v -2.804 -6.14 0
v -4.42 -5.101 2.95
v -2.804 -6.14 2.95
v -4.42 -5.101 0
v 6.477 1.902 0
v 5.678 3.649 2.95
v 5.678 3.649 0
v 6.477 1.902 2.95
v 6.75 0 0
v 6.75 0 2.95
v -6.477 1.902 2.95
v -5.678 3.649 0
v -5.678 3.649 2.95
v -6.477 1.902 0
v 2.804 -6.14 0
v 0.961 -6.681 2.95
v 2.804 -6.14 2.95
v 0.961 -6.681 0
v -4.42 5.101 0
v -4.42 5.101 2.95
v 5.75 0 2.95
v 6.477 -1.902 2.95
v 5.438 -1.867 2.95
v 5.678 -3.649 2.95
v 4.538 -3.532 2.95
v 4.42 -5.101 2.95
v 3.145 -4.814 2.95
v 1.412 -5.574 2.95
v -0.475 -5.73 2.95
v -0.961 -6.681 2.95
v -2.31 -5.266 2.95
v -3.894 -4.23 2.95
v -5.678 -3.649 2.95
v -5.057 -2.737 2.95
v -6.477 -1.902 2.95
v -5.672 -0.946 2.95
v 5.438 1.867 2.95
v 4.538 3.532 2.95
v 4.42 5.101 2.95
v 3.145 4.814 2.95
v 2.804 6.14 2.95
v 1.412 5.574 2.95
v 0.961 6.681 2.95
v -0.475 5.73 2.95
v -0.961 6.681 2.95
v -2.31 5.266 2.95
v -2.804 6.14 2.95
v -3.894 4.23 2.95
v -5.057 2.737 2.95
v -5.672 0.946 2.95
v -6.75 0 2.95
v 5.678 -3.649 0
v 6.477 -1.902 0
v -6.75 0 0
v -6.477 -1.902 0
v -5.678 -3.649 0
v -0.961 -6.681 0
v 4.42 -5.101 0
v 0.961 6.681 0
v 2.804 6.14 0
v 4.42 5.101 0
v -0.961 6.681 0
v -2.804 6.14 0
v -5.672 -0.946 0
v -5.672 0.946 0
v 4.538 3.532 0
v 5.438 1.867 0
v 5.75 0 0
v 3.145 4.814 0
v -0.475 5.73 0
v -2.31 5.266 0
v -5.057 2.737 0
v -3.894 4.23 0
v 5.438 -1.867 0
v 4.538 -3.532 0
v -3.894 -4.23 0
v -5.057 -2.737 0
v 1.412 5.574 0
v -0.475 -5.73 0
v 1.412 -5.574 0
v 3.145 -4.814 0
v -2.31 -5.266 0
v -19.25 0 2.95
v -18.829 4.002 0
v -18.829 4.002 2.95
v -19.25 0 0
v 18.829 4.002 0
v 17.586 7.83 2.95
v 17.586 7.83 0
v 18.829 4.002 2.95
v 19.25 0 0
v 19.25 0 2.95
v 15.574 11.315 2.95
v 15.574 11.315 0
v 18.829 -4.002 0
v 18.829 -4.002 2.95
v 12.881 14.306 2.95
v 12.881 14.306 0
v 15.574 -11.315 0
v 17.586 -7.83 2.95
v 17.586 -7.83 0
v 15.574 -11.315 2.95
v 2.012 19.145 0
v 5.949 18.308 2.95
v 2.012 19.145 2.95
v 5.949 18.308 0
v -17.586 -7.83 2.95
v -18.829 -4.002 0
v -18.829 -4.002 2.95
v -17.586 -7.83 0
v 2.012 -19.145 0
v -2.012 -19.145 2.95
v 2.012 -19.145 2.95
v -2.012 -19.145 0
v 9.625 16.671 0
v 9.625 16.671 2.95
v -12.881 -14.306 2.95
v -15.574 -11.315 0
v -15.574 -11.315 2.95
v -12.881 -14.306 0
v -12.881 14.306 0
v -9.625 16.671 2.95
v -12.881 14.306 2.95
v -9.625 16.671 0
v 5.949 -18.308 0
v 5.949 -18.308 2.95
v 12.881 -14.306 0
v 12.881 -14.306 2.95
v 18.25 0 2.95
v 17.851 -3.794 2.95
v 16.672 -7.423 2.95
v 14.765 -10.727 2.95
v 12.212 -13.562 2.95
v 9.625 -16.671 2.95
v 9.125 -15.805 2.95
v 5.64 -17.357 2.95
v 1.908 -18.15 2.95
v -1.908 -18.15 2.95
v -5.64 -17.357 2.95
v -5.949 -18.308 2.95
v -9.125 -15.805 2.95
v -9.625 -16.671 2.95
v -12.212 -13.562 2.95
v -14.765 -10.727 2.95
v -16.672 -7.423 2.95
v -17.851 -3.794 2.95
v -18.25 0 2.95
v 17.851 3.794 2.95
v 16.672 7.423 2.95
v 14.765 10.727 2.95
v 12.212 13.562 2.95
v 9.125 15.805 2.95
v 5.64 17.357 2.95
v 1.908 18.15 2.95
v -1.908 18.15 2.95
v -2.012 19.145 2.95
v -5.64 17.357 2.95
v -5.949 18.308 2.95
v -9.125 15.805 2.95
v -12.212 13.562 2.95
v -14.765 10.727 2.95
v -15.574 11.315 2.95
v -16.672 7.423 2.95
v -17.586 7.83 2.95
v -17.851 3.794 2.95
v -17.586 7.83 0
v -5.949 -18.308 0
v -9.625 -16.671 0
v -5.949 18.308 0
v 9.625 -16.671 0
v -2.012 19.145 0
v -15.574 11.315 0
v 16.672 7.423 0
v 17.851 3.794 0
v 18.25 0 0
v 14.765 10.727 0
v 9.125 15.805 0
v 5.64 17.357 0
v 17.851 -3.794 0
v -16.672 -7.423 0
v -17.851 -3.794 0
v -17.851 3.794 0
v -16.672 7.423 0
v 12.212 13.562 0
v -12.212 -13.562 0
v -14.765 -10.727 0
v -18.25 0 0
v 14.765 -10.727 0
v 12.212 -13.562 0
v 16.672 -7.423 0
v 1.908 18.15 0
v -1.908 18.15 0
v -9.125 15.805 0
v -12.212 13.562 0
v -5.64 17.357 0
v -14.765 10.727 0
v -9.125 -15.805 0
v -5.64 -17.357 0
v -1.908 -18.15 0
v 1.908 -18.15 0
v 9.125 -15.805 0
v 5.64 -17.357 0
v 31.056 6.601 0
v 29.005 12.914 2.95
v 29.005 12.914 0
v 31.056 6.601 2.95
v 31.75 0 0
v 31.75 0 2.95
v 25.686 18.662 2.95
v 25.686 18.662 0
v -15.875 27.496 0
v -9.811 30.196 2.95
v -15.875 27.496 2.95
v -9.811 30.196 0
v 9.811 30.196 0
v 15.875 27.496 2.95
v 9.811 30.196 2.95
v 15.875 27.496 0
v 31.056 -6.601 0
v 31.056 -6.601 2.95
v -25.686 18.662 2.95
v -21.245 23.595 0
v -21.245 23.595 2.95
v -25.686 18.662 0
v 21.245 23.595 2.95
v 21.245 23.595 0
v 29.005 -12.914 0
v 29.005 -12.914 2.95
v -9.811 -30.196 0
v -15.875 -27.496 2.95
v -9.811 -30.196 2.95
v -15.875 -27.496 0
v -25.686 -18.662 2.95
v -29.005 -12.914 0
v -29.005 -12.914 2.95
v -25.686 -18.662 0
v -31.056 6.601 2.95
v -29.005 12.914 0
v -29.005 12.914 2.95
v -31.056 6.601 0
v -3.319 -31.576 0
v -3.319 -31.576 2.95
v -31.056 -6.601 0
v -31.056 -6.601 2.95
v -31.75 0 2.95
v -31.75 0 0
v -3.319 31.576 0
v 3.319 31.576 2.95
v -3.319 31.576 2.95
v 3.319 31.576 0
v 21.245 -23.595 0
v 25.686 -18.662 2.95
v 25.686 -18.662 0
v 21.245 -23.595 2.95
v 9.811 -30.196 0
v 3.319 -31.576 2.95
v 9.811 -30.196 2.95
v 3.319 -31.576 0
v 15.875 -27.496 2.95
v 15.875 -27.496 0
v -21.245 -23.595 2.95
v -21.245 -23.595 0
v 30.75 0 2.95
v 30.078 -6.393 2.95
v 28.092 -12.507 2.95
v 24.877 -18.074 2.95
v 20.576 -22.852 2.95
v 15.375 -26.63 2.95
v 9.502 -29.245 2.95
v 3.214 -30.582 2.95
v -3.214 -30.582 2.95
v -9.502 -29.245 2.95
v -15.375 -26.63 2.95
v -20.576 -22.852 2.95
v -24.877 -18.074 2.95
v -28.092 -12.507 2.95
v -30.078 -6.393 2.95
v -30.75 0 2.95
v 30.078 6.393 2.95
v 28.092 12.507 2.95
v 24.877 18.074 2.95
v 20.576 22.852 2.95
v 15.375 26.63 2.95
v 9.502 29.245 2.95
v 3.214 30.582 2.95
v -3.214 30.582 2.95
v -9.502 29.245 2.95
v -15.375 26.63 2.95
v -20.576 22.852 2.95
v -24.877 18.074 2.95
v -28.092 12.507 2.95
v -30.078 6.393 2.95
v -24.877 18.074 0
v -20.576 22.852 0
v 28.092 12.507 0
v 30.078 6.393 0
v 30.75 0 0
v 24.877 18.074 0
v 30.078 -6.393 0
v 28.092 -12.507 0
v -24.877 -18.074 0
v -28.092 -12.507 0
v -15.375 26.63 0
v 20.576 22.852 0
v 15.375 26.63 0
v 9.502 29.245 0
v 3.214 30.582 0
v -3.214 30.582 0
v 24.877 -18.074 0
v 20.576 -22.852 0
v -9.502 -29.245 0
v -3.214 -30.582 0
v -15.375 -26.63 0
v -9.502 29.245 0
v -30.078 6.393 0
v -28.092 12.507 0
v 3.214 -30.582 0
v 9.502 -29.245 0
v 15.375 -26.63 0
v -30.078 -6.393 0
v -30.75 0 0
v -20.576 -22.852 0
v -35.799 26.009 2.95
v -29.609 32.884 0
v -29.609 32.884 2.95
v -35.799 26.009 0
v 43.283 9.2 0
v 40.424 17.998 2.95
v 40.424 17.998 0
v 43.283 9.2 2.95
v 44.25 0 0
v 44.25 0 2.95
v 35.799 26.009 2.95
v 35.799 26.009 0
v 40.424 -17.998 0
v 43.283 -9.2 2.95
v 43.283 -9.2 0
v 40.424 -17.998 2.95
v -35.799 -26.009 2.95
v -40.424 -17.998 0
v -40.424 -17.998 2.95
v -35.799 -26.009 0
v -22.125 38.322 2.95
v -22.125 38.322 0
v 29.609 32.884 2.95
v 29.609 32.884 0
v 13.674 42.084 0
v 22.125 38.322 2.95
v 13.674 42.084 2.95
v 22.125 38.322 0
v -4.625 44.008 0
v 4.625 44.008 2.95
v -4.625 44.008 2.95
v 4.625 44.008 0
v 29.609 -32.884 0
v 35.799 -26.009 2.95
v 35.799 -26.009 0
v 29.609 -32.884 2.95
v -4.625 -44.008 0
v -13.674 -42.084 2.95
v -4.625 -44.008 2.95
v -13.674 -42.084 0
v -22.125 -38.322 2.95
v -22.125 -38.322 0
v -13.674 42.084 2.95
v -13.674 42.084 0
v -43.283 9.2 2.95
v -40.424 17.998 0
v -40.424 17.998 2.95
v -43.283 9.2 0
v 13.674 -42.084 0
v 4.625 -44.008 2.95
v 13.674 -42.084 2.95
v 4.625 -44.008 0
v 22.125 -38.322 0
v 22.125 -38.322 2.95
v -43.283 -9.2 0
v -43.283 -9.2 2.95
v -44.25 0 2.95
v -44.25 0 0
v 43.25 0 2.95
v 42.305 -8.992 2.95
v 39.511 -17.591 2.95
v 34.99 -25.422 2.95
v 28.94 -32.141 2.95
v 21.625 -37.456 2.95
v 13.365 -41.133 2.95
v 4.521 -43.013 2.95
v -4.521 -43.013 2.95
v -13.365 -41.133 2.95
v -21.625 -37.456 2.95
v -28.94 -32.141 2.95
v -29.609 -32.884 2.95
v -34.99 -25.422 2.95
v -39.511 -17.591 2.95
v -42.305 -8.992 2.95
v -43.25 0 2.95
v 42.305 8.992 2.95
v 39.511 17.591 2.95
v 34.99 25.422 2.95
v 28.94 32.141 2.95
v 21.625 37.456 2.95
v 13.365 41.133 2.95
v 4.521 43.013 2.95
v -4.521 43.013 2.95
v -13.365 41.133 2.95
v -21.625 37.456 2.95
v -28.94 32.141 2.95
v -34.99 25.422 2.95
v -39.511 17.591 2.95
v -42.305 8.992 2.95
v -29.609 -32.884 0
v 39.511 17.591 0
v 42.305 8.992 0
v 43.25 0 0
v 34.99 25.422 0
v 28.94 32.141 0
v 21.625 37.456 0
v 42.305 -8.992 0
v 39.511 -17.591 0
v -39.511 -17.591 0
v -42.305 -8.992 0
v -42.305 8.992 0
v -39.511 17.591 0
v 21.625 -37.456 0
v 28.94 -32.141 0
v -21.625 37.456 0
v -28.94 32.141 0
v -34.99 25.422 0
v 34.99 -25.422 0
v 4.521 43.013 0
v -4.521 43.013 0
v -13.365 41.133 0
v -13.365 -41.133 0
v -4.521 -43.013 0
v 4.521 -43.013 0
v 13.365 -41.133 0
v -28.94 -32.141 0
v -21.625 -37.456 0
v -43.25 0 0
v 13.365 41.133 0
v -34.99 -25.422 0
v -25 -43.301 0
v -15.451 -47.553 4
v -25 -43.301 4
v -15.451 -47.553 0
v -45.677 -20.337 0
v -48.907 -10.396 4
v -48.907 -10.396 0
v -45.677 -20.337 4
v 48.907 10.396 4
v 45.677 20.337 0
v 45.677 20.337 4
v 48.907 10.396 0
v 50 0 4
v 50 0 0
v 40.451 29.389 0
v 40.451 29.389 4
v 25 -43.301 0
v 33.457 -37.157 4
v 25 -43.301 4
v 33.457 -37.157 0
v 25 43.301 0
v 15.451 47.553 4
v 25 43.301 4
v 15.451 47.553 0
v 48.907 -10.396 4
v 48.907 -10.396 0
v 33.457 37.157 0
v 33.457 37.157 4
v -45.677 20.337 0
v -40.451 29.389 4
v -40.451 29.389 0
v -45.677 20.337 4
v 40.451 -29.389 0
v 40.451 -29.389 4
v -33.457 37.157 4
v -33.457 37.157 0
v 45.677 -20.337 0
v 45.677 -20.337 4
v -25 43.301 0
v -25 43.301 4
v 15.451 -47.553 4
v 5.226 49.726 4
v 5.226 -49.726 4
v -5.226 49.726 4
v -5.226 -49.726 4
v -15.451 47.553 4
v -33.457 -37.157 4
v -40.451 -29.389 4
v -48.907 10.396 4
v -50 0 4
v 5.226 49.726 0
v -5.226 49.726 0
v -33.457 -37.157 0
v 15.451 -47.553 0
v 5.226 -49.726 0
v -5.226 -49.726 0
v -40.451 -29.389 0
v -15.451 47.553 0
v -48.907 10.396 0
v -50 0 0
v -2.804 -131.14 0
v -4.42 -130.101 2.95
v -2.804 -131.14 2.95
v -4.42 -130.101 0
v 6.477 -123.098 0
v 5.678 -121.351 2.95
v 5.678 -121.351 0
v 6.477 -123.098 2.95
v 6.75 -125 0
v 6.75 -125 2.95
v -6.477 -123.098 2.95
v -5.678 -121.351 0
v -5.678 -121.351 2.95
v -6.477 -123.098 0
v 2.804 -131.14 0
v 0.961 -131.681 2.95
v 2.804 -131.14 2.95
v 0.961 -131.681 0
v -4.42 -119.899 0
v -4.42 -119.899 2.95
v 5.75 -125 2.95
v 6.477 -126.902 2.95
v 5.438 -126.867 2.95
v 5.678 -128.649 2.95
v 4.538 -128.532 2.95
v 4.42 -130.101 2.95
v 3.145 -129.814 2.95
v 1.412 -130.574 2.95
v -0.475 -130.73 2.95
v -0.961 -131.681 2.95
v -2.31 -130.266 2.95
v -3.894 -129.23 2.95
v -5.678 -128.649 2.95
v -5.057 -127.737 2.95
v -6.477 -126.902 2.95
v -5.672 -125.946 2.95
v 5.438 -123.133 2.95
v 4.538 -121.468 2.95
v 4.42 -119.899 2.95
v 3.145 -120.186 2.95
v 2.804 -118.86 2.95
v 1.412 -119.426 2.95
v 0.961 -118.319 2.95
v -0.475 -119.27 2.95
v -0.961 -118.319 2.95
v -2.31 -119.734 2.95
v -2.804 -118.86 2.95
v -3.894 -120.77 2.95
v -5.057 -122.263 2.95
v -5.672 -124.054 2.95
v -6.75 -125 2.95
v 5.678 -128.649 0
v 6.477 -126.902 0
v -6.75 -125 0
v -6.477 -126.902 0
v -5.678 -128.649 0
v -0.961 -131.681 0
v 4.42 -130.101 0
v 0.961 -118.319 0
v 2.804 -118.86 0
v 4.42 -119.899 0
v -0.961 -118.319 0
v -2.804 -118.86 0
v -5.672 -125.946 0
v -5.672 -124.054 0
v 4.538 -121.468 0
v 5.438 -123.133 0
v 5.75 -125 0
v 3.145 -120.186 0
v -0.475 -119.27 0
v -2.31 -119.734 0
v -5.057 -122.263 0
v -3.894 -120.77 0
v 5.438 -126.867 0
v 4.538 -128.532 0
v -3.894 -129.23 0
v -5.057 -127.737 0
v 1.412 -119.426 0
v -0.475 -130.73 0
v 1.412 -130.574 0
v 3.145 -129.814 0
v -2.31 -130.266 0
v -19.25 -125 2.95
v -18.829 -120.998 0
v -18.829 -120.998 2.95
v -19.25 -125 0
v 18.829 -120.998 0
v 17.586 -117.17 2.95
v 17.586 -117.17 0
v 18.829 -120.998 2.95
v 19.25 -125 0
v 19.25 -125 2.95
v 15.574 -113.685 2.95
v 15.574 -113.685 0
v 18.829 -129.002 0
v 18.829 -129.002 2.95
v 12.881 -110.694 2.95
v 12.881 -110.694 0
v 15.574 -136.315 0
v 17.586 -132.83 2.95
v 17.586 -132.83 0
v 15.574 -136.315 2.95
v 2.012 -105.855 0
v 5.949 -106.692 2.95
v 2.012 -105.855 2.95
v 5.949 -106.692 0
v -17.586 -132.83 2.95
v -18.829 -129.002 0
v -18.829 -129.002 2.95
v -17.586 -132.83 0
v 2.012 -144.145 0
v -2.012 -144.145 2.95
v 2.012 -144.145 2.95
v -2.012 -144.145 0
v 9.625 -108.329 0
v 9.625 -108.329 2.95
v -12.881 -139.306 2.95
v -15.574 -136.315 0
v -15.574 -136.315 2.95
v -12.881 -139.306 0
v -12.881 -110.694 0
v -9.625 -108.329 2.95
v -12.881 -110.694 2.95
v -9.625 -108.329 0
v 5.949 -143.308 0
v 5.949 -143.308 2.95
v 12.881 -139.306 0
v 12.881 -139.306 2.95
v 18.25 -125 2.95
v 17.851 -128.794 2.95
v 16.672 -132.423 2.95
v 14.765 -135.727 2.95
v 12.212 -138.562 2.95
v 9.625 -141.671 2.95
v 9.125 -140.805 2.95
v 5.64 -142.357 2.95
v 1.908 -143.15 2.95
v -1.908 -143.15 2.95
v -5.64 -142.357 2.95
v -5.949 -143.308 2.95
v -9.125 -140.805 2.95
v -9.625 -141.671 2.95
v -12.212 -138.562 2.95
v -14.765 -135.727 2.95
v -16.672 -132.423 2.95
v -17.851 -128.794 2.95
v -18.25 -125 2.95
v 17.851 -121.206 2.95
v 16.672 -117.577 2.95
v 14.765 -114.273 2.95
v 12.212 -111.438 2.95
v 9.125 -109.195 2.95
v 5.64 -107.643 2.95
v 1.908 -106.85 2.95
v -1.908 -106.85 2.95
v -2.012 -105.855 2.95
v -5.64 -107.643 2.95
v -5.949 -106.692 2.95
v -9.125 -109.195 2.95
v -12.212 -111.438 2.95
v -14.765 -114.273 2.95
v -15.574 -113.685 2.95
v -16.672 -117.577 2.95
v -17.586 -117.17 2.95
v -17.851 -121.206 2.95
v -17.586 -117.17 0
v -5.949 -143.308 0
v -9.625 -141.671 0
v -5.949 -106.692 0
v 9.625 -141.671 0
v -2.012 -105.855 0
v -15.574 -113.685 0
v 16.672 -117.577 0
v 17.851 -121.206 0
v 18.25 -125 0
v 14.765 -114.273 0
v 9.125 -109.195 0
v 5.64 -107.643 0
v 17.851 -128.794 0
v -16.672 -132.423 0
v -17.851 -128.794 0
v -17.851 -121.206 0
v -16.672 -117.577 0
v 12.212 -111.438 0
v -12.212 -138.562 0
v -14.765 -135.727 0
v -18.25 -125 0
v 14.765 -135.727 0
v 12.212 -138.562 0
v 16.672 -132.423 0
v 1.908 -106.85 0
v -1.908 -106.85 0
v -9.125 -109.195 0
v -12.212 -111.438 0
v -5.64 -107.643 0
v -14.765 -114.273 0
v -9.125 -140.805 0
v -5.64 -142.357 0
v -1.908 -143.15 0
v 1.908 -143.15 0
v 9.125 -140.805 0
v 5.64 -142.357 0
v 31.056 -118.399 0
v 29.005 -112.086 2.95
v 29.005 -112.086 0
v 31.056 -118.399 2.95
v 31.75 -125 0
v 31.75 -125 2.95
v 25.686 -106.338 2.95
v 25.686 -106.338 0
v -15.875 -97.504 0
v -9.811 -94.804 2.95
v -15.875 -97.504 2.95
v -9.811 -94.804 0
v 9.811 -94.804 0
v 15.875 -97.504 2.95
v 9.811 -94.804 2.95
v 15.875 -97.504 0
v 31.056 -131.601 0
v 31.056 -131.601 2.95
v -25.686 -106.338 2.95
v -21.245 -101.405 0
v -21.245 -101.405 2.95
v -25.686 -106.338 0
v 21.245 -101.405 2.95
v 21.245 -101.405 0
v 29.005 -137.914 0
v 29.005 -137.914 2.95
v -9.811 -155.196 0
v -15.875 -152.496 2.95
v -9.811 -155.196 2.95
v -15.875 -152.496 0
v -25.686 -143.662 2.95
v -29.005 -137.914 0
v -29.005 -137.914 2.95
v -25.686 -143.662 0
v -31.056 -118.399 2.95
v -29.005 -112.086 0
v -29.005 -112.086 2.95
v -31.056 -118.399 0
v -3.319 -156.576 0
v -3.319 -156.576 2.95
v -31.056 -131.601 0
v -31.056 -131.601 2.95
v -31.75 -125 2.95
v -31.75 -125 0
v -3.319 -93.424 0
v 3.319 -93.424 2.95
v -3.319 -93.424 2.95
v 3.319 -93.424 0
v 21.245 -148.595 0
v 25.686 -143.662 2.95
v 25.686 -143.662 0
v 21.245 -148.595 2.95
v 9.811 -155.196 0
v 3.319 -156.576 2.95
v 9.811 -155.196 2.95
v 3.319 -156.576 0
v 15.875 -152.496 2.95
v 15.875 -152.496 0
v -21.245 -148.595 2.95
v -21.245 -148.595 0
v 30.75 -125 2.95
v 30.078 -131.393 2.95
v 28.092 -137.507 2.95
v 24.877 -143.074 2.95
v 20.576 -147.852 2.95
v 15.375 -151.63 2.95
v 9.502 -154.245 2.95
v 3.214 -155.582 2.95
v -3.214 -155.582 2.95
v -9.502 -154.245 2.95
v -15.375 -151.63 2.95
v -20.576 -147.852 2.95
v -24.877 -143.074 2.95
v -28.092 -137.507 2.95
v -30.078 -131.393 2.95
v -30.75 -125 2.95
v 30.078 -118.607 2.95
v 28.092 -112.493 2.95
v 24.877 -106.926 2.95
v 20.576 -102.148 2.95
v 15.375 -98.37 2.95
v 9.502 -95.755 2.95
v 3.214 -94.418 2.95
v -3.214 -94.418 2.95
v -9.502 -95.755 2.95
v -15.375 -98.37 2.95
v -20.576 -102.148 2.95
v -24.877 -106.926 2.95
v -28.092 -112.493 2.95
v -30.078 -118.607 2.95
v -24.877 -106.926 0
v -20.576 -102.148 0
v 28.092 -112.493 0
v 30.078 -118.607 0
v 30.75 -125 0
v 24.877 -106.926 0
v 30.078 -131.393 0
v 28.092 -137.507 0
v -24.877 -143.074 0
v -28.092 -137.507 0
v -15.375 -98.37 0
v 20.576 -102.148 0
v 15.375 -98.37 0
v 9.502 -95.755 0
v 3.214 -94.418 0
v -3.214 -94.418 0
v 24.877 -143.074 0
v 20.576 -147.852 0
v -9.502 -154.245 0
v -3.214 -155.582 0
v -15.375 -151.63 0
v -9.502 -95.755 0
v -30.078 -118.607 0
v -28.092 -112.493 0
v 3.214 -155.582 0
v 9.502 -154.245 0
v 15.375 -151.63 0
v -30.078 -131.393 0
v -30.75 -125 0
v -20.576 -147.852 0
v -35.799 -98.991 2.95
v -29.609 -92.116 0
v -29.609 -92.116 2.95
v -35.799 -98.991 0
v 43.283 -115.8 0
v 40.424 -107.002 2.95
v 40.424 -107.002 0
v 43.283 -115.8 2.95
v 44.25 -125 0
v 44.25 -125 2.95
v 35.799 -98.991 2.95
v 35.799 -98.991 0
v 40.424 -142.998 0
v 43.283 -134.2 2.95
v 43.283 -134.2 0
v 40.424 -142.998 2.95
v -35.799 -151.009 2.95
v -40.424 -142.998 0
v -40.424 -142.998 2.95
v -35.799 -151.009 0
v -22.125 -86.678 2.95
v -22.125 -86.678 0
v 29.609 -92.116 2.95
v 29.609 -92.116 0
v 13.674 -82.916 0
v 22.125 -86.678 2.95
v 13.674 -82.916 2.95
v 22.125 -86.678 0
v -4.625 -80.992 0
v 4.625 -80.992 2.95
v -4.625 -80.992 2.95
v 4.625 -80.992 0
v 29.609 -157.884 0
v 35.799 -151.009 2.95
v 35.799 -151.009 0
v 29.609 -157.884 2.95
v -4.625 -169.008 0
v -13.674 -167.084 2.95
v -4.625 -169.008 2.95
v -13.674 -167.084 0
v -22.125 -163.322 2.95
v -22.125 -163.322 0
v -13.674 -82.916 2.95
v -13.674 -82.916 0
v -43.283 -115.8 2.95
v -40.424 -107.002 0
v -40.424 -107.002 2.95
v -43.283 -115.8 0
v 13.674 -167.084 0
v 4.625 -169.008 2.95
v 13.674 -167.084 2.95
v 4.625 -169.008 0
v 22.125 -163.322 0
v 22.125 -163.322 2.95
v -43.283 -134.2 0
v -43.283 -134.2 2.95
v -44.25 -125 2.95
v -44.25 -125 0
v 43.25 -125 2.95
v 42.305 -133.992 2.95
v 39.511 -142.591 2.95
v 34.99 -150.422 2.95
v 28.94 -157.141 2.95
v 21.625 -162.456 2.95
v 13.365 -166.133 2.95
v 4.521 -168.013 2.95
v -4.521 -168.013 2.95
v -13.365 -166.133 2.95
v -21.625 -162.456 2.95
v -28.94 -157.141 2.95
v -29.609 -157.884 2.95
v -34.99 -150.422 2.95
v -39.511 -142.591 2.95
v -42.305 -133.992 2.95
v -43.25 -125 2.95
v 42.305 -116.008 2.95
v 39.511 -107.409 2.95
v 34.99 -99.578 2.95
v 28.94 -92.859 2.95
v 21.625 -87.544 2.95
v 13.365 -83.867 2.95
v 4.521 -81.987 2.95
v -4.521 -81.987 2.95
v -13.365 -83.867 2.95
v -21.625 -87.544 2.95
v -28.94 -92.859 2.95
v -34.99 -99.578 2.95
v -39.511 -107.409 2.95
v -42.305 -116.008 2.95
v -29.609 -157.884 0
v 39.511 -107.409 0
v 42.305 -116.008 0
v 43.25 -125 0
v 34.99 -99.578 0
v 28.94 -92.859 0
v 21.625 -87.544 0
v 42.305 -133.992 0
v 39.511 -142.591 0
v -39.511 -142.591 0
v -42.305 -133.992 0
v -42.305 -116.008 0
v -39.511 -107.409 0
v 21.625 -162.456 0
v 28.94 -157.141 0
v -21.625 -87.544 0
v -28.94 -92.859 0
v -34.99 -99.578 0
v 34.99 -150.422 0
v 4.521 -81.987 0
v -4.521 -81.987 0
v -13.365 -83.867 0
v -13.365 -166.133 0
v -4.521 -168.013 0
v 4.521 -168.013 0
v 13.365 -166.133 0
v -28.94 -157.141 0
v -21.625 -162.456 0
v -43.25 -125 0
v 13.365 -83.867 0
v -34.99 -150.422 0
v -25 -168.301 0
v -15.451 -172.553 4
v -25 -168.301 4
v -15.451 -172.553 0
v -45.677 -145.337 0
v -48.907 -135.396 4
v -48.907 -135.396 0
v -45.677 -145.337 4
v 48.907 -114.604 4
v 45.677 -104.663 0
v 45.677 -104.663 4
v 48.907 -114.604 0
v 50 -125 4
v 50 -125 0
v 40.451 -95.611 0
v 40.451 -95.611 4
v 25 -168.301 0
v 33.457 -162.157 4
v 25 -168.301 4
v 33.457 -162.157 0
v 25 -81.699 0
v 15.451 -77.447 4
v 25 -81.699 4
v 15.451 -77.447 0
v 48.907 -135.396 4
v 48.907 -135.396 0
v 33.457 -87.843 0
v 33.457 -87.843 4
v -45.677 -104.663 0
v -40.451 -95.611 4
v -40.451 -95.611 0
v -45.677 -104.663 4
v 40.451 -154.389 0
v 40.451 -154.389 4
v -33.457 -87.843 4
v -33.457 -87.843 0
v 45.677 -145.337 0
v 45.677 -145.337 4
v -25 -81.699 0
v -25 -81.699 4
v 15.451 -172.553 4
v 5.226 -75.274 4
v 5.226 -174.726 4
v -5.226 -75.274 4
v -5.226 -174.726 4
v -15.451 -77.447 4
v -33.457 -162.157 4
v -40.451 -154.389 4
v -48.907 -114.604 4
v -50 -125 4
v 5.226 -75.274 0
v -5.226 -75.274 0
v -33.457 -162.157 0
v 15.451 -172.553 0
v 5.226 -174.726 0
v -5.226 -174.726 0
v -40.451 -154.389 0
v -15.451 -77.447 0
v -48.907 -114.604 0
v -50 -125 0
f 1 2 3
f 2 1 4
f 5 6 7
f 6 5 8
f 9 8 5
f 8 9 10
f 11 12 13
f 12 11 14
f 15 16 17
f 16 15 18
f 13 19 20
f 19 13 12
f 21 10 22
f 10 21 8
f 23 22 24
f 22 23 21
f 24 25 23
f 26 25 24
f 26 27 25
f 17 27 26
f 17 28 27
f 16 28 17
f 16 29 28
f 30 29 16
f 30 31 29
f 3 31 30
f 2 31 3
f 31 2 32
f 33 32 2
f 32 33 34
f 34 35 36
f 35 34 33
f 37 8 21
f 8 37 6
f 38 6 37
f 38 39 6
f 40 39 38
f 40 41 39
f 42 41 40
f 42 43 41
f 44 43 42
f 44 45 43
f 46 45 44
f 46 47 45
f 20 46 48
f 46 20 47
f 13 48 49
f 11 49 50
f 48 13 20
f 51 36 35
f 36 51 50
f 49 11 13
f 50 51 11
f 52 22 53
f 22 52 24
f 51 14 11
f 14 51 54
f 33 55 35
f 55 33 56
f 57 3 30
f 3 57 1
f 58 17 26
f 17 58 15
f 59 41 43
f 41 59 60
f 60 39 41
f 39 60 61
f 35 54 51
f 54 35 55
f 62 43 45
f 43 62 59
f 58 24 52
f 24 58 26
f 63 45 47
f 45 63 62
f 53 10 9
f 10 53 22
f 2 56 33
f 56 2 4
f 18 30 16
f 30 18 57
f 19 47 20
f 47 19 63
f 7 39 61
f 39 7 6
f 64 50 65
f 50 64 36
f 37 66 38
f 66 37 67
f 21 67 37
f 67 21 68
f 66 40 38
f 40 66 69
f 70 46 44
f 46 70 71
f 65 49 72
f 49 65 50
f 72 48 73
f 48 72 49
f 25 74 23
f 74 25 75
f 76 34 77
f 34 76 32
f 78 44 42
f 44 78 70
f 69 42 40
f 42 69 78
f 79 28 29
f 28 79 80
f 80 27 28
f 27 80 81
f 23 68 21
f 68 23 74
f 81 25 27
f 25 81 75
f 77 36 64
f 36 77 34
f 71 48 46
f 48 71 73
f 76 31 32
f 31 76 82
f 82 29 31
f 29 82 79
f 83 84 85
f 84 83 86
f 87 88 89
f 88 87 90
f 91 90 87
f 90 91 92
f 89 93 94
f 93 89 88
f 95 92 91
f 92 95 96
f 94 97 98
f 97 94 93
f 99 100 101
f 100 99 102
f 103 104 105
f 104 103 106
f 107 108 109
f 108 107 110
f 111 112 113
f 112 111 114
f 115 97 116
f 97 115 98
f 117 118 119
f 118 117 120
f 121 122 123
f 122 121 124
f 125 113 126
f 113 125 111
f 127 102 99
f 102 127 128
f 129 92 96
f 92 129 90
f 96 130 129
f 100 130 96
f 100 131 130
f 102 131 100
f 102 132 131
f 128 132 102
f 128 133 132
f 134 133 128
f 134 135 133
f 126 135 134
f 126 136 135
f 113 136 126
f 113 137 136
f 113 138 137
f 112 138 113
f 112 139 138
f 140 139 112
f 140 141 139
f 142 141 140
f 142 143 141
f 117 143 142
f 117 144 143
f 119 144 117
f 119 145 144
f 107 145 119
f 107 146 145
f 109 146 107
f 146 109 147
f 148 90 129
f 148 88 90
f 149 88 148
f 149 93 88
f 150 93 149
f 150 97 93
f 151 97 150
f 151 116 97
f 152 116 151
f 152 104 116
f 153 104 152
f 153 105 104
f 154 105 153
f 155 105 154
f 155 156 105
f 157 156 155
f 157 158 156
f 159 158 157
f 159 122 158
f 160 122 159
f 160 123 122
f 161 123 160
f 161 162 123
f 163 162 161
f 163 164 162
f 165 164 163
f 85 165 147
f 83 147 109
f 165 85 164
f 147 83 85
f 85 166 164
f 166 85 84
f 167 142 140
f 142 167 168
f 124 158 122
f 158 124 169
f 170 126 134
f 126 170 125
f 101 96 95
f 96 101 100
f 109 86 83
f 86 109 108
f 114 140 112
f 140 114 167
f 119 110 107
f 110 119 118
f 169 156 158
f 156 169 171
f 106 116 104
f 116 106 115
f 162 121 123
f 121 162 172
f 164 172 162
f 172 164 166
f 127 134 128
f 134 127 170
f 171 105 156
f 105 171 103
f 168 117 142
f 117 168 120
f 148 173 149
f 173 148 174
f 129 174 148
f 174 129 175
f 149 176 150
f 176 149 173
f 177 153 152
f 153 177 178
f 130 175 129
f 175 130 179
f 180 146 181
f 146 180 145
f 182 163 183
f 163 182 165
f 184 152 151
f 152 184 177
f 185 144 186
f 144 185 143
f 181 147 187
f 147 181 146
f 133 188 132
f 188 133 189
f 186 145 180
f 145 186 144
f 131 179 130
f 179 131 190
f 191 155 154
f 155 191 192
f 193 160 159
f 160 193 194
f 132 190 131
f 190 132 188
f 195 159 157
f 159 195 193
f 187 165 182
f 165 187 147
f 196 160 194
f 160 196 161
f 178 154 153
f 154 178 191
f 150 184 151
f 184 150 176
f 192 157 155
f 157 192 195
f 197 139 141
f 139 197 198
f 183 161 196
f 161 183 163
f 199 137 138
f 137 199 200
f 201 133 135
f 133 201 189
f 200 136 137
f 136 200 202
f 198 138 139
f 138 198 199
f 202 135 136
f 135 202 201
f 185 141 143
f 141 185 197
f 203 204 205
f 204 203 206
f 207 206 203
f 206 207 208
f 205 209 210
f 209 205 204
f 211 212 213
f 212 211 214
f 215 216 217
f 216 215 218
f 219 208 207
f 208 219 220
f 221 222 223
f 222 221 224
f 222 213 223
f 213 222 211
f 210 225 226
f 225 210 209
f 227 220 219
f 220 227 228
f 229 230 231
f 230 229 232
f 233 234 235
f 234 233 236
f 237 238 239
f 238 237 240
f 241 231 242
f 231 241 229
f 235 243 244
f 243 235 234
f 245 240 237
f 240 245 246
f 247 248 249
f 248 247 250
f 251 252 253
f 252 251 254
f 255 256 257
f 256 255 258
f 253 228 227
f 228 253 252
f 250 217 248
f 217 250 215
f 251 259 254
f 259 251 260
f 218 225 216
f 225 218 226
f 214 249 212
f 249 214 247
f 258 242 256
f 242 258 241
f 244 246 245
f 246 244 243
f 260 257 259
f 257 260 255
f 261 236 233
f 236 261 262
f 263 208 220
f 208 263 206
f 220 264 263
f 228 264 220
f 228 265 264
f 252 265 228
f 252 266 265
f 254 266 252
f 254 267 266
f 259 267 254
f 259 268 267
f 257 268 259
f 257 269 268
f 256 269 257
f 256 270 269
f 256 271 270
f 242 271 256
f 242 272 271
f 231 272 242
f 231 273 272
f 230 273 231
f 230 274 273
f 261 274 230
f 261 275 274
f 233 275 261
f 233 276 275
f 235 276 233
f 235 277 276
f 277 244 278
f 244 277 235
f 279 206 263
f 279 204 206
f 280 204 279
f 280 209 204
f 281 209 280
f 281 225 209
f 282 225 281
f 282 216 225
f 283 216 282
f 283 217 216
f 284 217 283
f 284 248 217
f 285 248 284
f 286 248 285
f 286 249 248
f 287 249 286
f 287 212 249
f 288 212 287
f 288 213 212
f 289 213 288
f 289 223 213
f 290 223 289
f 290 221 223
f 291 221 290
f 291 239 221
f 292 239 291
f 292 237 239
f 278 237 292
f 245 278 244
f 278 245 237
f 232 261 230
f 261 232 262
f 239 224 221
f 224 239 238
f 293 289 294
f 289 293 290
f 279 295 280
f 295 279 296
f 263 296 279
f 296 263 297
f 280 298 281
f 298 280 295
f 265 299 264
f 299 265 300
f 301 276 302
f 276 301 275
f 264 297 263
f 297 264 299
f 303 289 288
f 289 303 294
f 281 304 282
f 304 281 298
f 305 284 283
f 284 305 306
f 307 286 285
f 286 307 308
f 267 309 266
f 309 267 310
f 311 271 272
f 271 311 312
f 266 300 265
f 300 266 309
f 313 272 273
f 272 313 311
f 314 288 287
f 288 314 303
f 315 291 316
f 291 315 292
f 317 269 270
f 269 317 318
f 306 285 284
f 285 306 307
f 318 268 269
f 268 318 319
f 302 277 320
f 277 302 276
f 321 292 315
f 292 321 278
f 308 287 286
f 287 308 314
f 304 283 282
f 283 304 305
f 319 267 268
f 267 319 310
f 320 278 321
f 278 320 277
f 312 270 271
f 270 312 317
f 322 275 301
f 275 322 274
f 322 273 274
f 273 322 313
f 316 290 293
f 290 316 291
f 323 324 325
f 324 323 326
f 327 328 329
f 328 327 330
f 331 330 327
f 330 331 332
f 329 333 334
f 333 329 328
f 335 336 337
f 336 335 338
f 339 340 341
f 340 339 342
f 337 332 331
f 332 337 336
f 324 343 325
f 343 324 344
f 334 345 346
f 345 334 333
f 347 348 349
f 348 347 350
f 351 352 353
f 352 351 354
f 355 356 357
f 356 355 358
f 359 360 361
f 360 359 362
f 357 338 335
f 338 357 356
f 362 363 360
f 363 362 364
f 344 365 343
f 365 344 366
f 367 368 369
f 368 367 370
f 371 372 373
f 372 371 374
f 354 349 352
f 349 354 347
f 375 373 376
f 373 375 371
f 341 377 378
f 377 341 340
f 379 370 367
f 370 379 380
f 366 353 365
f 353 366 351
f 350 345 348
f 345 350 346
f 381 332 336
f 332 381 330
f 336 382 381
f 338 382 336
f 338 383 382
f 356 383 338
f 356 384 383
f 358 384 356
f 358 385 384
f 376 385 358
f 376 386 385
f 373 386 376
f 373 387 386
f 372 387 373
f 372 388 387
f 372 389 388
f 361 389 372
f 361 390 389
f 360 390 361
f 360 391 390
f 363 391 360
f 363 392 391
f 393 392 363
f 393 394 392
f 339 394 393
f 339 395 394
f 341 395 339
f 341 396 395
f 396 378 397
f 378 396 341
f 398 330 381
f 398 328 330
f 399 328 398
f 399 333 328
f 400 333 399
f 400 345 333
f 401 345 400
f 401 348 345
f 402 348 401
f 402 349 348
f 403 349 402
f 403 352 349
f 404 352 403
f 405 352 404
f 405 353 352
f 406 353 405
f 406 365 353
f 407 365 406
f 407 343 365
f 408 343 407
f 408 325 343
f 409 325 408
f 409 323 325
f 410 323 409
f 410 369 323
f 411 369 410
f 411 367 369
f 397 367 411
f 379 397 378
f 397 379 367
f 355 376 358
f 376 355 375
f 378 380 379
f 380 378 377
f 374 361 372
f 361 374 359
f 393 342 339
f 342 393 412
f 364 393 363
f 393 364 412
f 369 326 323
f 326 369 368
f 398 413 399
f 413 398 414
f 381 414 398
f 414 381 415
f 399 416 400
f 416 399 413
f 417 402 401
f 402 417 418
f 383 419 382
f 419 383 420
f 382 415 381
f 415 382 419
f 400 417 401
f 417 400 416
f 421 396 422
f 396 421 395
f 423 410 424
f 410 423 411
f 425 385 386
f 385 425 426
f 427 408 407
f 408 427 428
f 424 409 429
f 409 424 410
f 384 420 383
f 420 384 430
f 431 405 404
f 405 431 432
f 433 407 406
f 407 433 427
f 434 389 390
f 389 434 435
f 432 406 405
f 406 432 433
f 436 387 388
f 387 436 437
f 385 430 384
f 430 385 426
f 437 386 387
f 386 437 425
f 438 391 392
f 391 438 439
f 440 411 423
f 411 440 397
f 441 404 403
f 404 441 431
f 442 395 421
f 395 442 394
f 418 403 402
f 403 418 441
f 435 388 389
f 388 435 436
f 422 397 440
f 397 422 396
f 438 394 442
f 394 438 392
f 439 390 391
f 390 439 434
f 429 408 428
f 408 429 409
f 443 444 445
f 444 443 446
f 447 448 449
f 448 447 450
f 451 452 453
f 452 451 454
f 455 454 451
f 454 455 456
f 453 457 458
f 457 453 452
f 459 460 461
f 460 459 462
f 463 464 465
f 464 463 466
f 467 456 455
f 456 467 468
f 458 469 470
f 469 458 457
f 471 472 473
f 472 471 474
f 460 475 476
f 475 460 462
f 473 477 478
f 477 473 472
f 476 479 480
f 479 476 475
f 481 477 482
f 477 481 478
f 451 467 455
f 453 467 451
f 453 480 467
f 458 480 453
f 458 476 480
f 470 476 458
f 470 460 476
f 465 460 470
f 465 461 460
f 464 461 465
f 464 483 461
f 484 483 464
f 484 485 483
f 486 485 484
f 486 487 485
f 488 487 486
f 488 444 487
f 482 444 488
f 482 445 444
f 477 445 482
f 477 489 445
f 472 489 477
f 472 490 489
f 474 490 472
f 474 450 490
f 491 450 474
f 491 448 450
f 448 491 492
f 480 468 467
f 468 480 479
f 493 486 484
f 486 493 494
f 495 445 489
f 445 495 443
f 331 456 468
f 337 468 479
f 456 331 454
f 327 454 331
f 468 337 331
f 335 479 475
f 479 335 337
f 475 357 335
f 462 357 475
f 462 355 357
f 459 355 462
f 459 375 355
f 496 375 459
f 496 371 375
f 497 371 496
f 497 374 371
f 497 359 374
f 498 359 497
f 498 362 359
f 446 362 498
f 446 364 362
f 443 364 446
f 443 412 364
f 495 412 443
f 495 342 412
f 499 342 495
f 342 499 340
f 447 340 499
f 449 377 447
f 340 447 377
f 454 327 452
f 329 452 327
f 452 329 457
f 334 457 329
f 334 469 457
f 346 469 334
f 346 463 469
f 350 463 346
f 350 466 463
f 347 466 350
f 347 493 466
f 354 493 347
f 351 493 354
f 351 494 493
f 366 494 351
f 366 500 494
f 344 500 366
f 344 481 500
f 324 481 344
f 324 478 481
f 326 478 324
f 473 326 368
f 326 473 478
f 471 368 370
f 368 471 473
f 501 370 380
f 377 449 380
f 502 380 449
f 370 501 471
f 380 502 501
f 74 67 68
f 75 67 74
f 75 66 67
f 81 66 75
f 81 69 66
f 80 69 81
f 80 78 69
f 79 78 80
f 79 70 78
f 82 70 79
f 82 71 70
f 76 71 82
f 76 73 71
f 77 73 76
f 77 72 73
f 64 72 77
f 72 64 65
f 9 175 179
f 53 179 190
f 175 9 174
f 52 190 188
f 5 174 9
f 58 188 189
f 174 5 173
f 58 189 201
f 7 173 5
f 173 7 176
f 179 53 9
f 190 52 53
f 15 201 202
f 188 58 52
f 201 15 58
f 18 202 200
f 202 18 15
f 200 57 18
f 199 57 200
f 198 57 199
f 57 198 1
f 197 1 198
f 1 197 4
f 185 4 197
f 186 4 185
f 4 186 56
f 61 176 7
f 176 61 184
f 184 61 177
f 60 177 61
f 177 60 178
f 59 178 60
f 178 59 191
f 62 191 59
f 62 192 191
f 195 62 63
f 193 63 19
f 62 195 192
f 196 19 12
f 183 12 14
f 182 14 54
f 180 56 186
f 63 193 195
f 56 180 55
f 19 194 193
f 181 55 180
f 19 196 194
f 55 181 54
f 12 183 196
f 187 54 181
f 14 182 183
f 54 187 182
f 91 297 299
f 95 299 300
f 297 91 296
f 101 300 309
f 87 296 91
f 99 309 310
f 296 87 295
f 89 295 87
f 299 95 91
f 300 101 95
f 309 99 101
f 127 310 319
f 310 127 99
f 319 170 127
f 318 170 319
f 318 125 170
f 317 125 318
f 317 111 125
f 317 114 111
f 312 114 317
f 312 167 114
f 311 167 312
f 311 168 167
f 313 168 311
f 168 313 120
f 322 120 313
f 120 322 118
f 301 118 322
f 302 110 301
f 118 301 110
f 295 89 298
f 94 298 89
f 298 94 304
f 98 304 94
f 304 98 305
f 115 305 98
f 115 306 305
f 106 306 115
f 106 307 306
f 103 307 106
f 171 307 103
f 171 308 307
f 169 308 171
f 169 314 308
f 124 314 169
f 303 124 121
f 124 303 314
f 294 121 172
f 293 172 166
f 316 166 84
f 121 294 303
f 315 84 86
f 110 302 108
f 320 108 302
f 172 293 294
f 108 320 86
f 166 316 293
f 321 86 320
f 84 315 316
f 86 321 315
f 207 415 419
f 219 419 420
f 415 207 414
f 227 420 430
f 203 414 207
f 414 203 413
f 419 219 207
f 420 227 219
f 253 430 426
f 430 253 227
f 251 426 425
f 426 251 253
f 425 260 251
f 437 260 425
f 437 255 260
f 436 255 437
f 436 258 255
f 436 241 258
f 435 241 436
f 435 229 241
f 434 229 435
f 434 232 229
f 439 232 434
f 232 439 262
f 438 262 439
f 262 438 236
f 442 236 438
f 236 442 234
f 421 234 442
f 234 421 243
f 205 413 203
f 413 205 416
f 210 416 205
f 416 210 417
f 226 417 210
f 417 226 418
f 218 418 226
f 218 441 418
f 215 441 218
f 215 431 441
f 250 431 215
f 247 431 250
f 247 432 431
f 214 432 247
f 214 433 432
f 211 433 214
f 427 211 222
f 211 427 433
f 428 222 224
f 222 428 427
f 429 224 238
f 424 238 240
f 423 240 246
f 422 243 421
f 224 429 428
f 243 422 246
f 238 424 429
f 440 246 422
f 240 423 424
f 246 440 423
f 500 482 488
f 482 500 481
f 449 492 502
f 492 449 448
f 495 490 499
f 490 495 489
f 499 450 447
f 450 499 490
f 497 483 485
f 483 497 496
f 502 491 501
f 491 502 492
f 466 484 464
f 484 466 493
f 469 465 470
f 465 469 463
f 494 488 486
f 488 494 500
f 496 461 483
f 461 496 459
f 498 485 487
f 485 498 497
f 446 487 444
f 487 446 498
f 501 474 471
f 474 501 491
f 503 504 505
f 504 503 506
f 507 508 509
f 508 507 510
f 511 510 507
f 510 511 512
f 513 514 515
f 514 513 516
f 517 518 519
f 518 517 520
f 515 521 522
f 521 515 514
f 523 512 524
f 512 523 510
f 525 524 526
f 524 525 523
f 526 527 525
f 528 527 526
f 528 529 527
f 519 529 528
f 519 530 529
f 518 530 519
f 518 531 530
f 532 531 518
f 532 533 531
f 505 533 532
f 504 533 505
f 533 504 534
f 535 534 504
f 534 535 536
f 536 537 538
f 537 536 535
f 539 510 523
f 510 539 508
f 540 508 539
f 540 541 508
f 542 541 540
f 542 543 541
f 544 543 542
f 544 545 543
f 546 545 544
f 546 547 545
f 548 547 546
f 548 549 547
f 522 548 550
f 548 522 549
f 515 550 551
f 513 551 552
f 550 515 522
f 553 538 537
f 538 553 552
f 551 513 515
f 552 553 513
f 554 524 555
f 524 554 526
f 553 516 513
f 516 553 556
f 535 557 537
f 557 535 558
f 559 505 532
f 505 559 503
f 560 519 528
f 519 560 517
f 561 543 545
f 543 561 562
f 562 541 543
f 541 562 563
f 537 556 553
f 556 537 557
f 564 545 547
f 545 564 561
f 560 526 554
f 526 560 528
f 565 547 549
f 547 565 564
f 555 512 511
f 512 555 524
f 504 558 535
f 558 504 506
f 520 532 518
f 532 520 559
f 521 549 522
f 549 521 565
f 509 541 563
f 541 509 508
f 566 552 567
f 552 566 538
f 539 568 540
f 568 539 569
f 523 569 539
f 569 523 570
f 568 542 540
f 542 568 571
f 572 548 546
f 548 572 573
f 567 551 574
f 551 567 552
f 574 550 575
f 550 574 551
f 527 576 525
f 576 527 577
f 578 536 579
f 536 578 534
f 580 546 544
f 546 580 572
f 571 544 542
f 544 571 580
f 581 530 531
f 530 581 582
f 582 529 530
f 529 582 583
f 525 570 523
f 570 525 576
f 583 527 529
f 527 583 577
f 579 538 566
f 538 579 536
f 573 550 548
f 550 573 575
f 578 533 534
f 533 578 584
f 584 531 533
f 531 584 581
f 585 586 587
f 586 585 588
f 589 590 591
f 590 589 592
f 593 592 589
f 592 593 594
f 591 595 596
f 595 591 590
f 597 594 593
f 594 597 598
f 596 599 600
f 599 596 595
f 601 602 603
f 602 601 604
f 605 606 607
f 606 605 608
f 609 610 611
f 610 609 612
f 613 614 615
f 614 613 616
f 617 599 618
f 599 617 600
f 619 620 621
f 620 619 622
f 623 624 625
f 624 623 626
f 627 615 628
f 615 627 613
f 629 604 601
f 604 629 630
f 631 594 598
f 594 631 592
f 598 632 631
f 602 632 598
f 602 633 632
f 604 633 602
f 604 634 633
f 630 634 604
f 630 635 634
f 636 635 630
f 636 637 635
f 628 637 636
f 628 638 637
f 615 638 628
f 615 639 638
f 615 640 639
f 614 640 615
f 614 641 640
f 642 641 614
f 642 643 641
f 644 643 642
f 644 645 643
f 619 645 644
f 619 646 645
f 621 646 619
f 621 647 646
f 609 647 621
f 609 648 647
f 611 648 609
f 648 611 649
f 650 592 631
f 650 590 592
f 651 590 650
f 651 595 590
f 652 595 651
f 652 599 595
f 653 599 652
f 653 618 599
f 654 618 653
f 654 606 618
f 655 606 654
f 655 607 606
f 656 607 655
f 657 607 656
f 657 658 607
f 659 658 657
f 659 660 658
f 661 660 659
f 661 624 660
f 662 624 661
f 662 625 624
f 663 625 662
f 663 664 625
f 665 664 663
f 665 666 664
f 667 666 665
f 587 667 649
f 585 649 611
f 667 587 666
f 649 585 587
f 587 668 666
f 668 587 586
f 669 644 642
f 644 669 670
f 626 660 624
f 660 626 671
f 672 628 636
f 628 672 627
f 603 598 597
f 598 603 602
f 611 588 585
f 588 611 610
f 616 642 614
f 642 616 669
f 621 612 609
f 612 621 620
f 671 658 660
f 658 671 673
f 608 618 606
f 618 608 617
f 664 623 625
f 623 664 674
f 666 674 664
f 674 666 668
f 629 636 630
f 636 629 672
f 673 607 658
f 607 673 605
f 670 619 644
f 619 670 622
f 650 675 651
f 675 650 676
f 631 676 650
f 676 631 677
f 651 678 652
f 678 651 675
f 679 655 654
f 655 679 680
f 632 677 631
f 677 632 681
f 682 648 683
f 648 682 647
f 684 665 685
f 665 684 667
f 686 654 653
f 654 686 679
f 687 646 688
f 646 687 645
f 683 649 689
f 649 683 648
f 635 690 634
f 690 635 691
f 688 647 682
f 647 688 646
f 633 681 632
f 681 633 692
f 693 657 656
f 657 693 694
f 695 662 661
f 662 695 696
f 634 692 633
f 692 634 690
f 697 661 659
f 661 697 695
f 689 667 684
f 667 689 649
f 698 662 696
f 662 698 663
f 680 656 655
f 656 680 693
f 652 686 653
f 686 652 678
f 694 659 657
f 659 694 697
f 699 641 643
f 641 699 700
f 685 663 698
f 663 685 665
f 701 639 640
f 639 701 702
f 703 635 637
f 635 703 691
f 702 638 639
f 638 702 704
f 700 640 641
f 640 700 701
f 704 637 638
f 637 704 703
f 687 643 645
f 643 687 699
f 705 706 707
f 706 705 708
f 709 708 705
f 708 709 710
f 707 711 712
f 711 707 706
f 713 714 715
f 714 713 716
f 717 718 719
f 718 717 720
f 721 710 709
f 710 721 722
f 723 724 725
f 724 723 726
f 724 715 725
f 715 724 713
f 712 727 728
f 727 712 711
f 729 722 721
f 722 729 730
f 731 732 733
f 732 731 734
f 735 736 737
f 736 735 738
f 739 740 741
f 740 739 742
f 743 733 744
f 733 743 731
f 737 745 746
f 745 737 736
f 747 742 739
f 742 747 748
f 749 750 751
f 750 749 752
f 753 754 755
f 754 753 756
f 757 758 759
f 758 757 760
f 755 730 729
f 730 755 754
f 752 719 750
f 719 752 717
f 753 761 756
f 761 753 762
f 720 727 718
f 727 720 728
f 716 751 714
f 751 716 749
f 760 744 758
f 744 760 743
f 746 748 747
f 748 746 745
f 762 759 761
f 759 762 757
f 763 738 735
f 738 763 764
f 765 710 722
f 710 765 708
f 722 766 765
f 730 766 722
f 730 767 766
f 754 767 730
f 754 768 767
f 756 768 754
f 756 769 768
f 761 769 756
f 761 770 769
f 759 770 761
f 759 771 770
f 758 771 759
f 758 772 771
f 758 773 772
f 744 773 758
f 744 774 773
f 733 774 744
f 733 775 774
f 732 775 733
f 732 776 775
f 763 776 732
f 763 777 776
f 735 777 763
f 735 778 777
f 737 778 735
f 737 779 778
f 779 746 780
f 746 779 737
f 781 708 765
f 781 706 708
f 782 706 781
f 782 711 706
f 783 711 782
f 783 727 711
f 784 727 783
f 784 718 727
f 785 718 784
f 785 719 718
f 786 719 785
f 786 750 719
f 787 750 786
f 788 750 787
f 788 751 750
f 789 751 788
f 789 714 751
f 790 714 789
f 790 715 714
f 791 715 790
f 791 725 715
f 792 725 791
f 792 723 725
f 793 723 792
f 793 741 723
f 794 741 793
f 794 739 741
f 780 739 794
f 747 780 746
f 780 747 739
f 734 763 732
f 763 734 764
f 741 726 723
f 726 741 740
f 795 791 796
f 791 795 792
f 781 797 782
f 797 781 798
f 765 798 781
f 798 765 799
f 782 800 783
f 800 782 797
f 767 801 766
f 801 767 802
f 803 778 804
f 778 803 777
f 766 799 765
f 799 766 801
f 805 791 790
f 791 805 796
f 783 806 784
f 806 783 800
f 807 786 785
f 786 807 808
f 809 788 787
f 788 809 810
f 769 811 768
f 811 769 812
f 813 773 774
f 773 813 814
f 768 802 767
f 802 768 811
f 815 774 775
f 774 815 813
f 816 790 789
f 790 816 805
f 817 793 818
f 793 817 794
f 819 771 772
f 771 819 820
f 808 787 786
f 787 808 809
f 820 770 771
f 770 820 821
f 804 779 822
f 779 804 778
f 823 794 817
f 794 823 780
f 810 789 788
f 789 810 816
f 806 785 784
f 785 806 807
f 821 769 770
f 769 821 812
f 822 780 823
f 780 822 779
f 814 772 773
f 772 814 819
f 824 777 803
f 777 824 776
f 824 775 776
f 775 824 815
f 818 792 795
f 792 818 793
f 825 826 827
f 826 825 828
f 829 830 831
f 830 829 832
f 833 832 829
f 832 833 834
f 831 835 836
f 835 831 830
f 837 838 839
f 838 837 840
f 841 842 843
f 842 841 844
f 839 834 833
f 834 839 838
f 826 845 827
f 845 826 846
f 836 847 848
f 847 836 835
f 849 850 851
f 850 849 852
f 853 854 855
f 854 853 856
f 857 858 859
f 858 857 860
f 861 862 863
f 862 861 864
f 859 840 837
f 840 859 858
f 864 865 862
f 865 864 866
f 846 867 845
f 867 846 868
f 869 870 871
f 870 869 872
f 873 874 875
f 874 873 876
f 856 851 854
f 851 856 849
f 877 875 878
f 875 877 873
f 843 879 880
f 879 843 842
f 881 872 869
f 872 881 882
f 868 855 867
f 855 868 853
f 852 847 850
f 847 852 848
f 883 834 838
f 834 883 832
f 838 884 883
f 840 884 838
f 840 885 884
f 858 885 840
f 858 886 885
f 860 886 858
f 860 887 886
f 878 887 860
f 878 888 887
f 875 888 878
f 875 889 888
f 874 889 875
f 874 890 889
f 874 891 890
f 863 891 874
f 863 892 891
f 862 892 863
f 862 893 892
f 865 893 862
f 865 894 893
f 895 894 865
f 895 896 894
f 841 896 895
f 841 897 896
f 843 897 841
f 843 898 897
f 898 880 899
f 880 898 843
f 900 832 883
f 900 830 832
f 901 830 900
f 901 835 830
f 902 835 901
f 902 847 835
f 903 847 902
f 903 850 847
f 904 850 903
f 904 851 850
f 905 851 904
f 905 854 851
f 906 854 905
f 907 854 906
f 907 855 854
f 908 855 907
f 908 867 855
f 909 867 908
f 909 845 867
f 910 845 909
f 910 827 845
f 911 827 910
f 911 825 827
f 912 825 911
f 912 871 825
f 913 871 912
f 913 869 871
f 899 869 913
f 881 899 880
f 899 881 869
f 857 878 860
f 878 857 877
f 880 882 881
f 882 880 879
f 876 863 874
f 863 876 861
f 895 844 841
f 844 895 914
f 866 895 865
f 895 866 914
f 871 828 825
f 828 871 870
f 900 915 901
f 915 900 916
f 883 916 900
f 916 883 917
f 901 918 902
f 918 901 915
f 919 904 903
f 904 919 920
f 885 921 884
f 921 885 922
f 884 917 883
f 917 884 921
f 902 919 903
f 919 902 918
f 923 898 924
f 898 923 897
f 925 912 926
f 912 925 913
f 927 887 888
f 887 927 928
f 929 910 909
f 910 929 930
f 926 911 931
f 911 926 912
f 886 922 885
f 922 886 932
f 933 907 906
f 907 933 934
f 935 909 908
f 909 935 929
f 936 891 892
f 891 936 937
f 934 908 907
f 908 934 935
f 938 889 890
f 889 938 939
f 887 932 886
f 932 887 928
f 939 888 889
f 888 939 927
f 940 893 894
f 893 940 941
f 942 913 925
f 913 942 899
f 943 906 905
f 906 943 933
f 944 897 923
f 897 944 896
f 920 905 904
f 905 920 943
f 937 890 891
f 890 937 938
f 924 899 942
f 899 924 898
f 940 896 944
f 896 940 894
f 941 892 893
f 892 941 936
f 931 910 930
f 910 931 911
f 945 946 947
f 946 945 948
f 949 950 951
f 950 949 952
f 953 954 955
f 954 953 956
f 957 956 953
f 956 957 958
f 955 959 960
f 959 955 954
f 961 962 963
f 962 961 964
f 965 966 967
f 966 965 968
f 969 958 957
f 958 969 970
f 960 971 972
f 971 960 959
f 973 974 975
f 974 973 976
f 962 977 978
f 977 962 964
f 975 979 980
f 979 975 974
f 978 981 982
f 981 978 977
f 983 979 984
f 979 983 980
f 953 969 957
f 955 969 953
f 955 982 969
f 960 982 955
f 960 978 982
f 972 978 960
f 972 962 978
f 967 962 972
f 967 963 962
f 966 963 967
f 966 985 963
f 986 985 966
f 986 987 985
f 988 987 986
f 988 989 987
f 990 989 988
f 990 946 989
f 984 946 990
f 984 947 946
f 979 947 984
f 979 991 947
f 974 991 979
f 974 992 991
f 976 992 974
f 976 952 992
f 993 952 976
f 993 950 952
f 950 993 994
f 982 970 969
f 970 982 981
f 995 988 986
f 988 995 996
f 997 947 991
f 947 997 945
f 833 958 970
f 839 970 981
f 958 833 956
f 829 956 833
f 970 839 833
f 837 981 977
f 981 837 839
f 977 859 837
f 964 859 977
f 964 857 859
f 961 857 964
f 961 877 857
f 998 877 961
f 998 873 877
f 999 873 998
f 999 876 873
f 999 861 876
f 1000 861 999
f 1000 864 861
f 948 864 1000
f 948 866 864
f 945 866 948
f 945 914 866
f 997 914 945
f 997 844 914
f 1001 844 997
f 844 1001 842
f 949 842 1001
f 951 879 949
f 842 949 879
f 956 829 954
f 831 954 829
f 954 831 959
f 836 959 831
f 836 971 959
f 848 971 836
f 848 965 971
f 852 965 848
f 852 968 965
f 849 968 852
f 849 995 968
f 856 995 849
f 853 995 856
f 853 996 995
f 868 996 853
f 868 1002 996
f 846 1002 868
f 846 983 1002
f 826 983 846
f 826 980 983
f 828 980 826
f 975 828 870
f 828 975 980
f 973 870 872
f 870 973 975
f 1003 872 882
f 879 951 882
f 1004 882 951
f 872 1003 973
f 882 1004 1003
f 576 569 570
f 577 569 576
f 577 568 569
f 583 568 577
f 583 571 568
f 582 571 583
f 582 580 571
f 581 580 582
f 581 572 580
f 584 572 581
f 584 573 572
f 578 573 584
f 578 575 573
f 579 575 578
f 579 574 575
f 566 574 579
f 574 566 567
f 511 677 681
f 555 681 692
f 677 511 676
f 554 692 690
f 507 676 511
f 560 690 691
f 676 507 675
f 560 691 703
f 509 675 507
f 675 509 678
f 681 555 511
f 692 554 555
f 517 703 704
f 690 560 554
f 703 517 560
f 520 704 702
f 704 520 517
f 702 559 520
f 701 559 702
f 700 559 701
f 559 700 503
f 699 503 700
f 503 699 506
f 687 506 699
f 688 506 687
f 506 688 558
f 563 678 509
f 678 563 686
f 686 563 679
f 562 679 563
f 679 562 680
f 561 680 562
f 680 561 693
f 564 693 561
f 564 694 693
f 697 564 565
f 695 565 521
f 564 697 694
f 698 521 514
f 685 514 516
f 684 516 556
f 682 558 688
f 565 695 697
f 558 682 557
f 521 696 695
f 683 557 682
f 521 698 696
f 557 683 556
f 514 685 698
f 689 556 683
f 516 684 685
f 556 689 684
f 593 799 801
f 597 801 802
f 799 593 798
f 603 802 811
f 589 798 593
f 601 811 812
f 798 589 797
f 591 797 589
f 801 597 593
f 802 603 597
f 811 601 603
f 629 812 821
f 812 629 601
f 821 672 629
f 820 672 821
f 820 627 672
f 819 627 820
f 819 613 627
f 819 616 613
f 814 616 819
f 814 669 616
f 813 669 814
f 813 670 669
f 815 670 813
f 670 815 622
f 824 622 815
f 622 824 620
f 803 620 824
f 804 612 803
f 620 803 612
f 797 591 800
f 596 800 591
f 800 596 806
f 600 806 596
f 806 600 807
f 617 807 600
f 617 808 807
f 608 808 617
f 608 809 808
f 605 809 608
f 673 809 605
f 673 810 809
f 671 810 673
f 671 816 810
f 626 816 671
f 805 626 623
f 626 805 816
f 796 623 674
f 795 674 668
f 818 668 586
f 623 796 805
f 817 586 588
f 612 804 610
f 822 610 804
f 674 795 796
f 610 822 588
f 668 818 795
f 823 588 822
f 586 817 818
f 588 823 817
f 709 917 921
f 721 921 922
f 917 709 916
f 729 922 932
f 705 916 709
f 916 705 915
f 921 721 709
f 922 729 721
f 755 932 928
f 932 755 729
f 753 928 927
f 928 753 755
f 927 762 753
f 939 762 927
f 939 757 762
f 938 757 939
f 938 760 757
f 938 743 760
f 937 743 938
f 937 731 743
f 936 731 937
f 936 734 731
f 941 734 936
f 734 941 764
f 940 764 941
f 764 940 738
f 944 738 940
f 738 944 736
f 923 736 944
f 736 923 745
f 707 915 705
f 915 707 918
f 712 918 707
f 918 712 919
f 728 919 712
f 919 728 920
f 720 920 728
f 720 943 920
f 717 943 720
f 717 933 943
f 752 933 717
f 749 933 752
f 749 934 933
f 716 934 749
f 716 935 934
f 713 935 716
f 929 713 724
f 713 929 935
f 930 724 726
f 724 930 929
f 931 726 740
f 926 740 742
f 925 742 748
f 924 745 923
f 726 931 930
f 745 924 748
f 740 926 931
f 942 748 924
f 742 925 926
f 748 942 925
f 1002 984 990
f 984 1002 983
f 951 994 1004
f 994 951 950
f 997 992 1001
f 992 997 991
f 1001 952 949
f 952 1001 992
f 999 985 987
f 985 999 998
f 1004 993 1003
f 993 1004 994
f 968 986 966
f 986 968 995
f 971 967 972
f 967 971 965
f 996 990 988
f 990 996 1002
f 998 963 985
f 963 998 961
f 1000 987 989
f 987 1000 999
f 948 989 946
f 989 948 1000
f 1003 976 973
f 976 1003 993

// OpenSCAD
// Define the diameter and number of sections for each radial section
$diameter = 100;
$num_sections1 = 2;  // Sections at the center
$num_sections2 = 8;  // Sections on the outside

// Calculate the radius
$radius = $diameter/2;

// Function to rotate and position text objects
module rotate_and_position(text, text_size, angle, x, depth_multiplier){
  rotate(angle)
  translate([x, 0, 0])
  rotate([0,180,270])
  scale([1, 1, depth_multiplier])
  text(text, size = text_size, halign = "center", valign = "center");
};

module make_radial(section_count, radial_placement, text_size, depth_multiplier){
    for (i = [0: section_count-1]){
          // Calculate the angle for each section
          $angle = (i * 360) / (section_count);
          $edge_angle = $angle - (180/section_count);

          // Define text for each section
          $text = str(i + 1);

          // Position text on the rim using the function with a smaller radius
          rotate_and_position($text, text_size, $angle, 0 + radial_placement, depth_multiplier);
          rotate_and_position("|", text_size, $edge_angle, 0 + radial_placement, depth_multiplier);
    }
}

module make_ring( depth, centered_at, width){
    translate([0,0,-0.05])
    difference(){
        cylinder(h = depth, r=centered_at + width/2);
        cylinder(h = depth, r=centered_at - width/2);
    };
}

difference(){
    cylinder(r = $radius, h = 4);
    make_ring(3, $radius/4*0.5, 1);
    make_radial(6, $radius/4, $radius/6, 3);
    make_ring(3, $radius/4*1.5, 1);
    make_radial(10, $radius/4*2, $radius/6, 3);
    make_ring(3, $radius/4*2.5, 1);
    make_radial(20, $radius/4*3, $radius/8, 4);
    make_ring(3, $radius/4*3.5, 1);
};

translate([0,-125,0])
difference(){
    cylinder(r = $radius, h = 4);
    make_ring(3, $radius/4*0.5, 1);
    make_radial(3, $radius/4, $radius/6, 3);
    make_ring(3, $radius/4*1.5, 1);
    make_radial(8, $radius/4*2, $radius/6, 3);
    make_ring(3, $radius/4*2.5, 1);
    make_radial(12, $radius/4*3, $radius/6, 4);
    make_ring(3, $radius/4*3.5, 1);
};
